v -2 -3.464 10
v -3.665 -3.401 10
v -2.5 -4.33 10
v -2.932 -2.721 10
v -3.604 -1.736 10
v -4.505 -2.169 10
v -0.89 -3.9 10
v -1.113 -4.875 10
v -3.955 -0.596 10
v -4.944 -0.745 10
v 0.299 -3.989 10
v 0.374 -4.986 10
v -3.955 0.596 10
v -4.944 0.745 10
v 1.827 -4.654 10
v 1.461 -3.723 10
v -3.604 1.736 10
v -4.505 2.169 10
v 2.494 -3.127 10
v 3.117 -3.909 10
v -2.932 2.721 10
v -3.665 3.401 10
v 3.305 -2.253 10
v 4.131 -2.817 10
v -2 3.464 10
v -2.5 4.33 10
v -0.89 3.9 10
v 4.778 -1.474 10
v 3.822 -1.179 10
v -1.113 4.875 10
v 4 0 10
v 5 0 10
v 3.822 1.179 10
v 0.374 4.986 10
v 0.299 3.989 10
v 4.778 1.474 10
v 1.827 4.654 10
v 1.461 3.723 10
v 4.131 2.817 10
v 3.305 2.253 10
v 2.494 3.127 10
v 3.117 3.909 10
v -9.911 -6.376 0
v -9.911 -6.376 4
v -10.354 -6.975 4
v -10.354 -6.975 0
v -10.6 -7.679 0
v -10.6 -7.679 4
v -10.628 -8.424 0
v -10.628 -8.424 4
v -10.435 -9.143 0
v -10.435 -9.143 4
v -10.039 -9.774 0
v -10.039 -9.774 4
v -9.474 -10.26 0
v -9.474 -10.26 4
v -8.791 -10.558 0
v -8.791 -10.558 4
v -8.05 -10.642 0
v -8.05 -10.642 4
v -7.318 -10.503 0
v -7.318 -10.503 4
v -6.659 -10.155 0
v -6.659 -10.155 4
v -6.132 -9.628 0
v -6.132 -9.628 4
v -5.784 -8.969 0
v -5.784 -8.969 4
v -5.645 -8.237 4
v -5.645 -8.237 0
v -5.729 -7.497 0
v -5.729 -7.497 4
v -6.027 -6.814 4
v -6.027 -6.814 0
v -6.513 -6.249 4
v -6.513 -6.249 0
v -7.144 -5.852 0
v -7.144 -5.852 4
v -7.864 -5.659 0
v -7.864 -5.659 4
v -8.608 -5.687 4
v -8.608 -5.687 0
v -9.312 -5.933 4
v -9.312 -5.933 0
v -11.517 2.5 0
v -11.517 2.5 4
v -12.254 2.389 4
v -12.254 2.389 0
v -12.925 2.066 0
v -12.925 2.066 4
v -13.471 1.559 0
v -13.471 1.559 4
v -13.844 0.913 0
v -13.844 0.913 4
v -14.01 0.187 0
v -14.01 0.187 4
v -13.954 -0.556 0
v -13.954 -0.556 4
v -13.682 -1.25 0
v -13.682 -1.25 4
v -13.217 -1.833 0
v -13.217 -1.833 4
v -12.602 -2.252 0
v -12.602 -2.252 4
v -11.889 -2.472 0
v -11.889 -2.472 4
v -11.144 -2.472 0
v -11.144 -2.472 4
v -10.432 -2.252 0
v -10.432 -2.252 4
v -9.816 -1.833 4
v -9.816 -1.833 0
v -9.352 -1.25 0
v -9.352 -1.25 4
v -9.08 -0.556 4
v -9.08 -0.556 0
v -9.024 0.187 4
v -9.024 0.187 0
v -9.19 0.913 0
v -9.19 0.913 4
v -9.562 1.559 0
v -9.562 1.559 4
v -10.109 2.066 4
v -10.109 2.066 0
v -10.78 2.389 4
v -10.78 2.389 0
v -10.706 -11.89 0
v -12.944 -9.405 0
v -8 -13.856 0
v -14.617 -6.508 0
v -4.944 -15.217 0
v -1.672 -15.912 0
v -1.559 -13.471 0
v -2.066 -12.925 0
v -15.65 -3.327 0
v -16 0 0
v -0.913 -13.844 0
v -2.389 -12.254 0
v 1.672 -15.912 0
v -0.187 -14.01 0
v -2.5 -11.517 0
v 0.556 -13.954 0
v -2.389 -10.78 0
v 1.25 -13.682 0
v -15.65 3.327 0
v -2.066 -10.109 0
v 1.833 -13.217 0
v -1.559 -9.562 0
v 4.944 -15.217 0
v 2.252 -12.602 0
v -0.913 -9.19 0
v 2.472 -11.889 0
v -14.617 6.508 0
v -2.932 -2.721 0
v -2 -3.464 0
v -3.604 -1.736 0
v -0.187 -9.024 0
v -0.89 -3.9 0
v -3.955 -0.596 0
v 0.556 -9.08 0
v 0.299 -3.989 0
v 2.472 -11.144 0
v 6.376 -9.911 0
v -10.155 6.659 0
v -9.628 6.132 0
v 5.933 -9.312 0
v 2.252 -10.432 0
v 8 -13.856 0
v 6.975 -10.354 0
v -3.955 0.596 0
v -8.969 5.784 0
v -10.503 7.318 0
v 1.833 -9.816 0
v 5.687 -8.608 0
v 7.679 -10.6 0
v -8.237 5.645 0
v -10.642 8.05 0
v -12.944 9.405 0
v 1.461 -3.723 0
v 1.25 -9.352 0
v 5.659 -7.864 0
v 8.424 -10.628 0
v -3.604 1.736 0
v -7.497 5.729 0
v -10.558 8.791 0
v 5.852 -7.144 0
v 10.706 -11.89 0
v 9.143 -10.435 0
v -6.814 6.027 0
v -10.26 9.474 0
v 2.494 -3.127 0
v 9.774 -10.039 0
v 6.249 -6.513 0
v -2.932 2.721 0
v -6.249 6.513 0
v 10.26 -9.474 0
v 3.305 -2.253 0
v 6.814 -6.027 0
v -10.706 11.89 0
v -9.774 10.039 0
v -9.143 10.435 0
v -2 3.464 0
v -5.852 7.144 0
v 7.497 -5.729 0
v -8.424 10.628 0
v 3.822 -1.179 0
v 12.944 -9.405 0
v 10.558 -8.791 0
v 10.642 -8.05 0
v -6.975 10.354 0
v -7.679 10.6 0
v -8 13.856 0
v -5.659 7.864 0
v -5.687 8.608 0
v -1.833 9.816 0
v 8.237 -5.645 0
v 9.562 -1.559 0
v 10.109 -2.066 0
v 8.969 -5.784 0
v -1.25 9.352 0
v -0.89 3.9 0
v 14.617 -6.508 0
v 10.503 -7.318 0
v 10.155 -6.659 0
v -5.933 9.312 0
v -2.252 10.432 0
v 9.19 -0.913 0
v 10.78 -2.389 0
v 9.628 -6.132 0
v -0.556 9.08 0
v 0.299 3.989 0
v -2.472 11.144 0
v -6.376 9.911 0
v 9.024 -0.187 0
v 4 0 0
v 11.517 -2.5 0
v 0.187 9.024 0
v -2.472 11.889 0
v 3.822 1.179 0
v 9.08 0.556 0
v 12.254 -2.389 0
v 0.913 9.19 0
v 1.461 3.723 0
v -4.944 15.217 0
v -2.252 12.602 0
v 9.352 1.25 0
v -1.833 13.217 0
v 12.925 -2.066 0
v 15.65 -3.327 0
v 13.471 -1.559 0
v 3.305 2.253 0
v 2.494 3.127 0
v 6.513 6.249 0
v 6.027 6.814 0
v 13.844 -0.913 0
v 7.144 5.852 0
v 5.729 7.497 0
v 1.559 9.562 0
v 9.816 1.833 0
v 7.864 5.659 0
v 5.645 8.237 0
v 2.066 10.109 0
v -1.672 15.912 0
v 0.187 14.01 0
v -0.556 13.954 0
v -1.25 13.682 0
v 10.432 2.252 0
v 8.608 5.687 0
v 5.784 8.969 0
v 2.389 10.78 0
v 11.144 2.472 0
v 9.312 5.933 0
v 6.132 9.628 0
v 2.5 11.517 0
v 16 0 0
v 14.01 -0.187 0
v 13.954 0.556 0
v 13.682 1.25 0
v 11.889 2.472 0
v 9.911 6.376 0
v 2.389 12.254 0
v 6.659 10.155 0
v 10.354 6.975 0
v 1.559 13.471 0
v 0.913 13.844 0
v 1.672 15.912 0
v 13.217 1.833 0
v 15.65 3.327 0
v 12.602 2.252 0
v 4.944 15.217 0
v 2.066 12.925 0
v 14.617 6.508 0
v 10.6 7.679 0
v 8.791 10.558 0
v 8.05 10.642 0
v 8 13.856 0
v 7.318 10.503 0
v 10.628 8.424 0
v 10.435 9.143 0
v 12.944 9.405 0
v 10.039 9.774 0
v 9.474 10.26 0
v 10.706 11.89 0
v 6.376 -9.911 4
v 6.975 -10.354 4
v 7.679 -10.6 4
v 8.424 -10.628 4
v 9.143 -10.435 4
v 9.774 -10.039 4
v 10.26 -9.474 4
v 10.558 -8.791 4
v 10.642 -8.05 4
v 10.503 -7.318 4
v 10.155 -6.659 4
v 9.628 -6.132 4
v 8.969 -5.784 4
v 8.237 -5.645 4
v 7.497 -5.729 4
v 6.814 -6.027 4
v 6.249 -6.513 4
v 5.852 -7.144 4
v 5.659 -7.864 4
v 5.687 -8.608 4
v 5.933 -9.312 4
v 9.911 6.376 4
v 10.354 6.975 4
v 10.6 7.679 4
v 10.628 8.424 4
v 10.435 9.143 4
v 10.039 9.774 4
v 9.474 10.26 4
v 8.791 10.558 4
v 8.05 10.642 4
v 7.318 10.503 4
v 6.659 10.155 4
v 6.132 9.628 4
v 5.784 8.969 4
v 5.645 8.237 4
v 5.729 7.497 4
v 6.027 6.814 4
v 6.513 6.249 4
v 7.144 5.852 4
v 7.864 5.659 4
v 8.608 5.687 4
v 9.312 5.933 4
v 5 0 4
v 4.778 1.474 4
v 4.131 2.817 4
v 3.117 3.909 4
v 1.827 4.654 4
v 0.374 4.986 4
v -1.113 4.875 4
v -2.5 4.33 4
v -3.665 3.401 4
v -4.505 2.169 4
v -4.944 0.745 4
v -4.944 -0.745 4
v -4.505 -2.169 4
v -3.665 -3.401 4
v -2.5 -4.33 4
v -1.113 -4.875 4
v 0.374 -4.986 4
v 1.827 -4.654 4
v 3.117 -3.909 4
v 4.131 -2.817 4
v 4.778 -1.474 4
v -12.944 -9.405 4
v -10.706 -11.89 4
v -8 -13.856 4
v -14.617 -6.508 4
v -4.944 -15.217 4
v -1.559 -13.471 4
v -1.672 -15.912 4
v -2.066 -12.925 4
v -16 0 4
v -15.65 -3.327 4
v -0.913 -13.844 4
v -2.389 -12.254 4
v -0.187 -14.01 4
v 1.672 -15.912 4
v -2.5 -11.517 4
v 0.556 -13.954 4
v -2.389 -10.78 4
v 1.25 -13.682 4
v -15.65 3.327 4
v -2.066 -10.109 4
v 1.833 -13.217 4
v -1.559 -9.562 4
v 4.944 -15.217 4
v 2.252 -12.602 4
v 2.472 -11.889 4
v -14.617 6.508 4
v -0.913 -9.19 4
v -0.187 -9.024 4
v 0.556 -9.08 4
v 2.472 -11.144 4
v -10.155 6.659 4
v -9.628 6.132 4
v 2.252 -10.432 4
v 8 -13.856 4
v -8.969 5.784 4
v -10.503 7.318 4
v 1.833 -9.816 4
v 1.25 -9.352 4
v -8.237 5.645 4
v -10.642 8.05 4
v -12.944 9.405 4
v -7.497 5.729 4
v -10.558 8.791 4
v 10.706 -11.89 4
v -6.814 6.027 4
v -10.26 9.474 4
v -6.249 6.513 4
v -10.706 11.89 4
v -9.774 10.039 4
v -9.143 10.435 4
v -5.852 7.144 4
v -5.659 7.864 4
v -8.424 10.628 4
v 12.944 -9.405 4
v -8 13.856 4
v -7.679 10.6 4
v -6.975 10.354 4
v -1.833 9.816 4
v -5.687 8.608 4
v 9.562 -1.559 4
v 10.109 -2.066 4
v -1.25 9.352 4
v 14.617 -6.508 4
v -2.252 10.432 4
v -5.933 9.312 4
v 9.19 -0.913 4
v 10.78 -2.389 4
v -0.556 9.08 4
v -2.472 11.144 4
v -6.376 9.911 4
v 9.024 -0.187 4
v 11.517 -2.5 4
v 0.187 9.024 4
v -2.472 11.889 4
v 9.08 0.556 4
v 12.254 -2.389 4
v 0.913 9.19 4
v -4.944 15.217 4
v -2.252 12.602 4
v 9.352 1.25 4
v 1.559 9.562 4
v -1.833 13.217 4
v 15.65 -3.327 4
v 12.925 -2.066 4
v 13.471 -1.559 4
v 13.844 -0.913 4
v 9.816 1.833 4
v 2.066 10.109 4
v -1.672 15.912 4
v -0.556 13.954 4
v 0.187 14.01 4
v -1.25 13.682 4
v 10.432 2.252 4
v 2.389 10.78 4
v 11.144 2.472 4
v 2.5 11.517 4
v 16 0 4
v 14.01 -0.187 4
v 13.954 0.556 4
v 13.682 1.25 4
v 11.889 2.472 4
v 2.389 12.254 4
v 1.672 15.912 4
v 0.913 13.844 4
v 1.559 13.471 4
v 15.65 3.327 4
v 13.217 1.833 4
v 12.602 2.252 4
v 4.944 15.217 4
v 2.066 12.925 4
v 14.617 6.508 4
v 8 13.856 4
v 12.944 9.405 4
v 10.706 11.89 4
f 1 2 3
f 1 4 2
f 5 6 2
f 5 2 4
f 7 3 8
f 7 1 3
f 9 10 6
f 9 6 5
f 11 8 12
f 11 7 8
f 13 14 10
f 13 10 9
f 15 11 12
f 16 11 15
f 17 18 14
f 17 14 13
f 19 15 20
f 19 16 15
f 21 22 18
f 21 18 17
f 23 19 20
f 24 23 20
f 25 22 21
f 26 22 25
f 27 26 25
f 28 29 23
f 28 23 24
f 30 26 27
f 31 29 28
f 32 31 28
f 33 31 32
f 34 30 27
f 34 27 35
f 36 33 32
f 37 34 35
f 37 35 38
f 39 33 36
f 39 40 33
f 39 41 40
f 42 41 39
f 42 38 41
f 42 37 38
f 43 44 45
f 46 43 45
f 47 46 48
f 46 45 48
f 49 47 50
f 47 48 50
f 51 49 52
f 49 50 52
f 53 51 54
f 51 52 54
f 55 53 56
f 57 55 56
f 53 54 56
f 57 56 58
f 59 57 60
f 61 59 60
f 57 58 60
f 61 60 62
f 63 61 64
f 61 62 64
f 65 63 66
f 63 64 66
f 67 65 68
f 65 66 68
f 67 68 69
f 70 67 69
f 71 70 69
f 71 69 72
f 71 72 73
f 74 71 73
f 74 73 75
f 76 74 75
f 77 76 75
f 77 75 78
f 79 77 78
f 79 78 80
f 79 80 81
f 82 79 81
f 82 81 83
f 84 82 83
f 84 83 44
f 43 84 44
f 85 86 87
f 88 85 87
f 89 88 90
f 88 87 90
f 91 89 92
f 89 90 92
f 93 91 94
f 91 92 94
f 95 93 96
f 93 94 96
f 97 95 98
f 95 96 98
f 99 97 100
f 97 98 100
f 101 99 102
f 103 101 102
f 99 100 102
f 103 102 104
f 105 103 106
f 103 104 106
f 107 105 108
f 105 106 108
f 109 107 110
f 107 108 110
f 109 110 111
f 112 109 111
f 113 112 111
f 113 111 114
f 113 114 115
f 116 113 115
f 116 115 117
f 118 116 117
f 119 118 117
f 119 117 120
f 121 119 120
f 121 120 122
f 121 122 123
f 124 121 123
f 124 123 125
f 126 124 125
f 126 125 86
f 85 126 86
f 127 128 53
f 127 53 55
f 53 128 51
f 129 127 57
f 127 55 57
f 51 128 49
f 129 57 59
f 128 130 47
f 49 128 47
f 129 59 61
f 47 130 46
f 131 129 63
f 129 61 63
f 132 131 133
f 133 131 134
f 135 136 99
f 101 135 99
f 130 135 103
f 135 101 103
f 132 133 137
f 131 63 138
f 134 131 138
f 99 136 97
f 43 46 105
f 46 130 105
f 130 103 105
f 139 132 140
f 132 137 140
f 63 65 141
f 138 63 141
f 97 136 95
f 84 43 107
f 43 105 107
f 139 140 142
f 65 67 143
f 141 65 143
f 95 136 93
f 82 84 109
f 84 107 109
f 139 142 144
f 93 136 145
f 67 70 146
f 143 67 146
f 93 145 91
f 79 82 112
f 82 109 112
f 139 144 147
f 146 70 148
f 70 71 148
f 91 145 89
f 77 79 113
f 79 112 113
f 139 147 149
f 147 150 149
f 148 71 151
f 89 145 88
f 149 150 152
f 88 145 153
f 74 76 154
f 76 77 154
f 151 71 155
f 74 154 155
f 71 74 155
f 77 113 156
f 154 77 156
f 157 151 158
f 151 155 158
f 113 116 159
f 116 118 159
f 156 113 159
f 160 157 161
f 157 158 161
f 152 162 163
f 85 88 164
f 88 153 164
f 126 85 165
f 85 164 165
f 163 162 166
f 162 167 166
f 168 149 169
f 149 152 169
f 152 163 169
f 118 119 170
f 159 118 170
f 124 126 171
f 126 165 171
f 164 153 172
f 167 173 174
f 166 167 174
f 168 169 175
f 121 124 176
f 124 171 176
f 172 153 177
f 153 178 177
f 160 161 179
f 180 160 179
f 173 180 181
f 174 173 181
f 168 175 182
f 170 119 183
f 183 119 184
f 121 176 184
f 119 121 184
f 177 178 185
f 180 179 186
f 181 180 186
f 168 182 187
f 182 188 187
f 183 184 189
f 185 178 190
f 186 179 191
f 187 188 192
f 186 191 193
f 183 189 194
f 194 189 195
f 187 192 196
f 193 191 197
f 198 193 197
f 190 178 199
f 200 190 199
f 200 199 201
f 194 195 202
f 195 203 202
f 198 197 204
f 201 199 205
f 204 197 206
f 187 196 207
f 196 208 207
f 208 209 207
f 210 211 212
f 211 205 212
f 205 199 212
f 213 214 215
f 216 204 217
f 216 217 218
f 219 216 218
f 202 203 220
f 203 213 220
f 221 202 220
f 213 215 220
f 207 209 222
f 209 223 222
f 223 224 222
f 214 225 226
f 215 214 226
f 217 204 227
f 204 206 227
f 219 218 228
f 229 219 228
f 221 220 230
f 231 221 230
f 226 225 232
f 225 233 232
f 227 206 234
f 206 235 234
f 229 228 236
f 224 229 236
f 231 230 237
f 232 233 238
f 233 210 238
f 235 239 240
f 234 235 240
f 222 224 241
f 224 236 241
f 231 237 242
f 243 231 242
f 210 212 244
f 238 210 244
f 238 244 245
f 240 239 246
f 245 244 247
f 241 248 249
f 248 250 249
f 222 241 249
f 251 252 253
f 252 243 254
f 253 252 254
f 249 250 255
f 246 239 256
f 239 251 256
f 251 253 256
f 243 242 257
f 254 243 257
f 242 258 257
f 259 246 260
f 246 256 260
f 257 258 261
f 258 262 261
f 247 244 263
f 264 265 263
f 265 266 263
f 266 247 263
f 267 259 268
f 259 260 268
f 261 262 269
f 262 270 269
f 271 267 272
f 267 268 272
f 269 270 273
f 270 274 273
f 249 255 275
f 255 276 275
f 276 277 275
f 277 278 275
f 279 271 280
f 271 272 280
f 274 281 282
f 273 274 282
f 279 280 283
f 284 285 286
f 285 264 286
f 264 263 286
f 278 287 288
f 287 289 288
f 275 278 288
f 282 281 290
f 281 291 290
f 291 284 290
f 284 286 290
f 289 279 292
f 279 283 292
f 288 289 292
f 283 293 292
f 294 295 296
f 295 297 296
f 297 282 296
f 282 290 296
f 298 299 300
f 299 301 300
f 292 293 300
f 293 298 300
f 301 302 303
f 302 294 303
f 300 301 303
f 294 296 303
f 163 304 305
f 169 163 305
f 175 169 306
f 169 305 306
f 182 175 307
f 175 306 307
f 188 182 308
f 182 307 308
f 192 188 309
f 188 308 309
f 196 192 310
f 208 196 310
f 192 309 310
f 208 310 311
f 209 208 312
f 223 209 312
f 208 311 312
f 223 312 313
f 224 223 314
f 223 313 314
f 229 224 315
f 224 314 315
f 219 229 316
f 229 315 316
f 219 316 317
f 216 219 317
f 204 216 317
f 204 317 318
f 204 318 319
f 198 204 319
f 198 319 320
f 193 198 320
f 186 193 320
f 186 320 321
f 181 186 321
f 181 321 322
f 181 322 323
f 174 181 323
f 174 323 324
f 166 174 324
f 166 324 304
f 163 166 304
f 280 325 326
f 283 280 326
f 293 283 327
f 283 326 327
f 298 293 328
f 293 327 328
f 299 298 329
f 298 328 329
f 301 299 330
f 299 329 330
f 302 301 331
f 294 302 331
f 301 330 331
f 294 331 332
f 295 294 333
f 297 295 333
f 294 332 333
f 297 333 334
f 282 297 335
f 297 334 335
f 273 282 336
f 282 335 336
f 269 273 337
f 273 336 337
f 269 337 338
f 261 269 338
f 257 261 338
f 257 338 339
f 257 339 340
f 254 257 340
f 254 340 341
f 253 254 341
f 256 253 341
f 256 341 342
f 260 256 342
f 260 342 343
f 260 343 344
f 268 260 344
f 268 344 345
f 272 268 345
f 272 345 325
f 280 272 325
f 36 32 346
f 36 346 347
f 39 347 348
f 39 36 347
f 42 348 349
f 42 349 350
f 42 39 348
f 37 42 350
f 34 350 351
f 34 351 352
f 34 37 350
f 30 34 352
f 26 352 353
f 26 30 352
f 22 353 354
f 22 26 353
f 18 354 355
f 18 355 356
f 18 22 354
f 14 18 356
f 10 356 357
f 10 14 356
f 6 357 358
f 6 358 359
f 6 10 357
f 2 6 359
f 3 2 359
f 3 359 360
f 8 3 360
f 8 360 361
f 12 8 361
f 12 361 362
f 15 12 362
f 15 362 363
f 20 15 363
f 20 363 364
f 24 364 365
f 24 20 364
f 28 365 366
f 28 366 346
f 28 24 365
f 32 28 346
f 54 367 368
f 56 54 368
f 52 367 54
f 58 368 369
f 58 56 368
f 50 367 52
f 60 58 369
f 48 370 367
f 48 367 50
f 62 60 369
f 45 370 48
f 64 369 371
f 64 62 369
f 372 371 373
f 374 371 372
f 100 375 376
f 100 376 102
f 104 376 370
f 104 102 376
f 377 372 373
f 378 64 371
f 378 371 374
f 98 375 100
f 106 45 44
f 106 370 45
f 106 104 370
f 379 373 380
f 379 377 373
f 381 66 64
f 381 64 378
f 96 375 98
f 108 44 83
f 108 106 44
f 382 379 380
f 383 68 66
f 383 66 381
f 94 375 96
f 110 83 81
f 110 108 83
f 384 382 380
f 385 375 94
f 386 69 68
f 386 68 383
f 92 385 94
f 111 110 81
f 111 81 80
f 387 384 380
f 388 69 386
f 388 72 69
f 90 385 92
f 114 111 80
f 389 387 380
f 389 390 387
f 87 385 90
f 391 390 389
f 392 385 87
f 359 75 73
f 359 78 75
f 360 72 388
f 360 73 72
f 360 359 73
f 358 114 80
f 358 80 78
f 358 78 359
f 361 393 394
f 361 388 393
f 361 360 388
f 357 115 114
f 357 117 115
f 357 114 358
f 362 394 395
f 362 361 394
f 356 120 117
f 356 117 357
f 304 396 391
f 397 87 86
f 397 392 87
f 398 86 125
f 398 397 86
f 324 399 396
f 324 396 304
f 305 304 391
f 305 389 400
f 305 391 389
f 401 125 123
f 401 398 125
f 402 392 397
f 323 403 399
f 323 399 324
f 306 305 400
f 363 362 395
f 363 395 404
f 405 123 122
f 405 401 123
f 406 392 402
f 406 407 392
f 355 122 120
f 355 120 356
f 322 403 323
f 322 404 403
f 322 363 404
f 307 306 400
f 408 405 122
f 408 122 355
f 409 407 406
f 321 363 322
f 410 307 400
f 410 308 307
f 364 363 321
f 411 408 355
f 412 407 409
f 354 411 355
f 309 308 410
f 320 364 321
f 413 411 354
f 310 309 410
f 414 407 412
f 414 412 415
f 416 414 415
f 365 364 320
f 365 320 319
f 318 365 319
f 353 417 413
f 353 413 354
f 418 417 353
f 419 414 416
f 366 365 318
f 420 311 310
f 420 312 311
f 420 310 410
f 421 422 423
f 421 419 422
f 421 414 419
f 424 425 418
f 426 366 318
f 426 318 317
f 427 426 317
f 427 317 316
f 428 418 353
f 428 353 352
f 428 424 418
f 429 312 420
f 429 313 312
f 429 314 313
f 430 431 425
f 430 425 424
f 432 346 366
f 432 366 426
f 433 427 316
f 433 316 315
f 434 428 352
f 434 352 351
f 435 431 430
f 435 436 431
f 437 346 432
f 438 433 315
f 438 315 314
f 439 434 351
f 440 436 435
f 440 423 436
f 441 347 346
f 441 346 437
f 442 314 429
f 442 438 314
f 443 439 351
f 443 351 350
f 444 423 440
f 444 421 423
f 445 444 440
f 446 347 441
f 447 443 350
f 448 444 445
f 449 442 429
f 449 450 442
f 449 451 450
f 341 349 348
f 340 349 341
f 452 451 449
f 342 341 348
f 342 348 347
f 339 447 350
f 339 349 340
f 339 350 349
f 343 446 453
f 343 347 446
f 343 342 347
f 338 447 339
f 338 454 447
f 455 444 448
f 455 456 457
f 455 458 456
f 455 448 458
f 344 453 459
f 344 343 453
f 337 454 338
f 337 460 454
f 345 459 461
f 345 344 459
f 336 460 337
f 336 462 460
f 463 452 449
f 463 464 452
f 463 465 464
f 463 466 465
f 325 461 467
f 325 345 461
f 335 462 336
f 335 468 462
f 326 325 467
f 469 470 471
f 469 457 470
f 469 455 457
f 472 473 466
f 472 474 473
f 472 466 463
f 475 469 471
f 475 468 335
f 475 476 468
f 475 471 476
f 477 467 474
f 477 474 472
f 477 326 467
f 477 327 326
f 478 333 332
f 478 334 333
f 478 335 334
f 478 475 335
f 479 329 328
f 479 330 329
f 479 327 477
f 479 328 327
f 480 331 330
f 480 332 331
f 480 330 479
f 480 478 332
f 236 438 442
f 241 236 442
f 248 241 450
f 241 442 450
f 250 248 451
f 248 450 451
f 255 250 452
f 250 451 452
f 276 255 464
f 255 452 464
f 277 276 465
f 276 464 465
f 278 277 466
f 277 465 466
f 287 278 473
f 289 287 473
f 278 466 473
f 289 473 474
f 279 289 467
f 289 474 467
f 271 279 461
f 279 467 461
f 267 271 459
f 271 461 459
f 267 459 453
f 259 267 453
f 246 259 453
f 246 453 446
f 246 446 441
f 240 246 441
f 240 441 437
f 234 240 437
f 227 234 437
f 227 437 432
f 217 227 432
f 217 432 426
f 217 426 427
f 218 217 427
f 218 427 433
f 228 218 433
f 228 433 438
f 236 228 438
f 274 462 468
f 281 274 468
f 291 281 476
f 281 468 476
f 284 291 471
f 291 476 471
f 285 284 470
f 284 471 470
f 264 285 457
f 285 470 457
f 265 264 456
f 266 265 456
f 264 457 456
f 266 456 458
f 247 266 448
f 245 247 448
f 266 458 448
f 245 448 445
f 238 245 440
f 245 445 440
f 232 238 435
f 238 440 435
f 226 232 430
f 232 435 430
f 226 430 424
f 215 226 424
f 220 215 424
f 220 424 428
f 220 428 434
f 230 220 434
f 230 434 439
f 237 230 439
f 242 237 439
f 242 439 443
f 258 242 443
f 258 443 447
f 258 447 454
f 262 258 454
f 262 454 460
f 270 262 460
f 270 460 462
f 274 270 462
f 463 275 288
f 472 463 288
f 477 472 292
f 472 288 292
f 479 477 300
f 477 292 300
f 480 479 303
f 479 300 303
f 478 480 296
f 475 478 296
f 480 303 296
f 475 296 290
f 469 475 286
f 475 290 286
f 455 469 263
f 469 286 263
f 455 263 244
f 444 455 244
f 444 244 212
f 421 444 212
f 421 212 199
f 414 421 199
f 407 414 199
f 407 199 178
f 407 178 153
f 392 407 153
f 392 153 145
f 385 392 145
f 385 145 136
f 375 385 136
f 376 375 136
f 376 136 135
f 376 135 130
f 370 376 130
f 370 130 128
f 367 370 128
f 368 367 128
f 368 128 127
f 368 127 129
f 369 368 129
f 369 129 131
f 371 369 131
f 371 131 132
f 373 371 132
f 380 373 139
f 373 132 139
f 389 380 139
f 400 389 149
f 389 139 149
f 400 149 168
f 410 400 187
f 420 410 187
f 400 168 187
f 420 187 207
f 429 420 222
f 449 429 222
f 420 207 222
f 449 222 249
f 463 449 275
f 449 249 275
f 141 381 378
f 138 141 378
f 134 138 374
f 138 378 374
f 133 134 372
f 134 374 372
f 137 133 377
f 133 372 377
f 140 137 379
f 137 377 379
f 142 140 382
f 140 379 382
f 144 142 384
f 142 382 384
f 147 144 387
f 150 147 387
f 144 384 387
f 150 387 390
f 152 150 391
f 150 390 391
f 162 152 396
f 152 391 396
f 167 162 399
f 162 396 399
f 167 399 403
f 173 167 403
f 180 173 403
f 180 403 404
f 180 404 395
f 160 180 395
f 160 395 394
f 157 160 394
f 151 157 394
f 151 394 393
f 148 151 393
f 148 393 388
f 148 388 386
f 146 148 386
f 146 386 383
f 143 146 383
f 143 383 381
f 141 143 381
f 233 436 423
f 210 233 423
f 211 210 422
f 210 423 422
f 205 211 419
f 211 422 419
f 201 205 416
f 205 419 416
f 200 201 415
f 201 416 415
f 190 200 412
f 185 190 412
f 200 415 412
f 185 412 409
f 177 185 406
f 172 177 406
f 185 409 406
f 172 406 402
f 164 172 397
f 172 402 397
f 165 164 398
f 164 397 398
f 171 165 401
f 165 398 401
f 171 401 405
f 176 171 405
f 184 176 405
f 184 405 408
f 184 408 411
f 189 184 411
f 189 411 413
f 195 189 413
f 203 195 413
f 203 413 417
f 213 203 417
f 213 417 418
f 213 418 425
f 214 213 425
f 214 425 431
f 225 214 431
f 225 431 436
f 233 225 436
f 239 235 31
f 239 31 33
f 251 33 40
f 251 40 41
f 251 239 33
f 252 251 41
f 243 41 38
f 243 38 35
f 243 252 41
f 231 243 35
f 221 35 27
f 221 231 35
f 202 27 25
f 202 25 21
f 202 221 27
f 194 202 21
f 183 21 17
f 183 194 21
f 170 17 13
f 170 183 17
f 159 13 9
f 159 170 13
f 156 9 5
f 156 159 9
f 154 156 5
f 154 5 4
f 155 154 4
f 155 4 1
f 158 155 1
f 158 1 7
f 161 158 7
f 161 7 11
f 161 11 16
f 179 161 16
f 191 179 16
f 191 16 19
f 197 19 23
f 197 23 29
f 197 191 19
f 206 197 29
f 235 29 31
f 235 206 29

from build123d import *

# Parameters (mm, degrees)
SKETCH_1_R               = 16
SKETCH_1_R_2             = 4
EXTRUDE_2_DEPTH          = 10
SKETCH_3_R               = 16
SKETCH_3_R_2             = 5
CUT_EXTRUDE_2_DEPTH      = 6
SKETCH_4_R               = 2.5
CUT_EXTRUDE_3_DEPTH      = 5
PATTERN_CIRCULAR_1_COUNT = 8


with BuildPart() as part:
    # 草图1 → 凸台-拉伸2 (new body)
    with BuildSketch(Plane.XY):
        Circle(SKETCH_1_R)
        Circle(SKETCH_1_R_2, mode=Mode.SUBTRACT)
    extrude(amount=EXTRUDE_2_DEPTH)

    # 草图3 → 切除-拉伸2 (cut)
    with BuildSketch(Plane.XY.offset(10)):
        Circle(SKETCH_3_R)
        Circle(SKETCH_3_R_2, mode=Mode.SUBTRACT)
    extrude(amount=-CUT_EXTRUDE_2_DEPTH, mode=Mode.SUBTRACT)

    # 草图4 → 切除-拉伸3 (cut, through all)
    with BuildSketch(Plane.XY.offset(4)):
        with Locations((0, 11.516849164)):
            Circle(SKETCH_4_R)
    cut_extrude_3 = extrude(amount=-CUT_EXTRUDE_3_DEPTH, mode=Mode.SUBTRACT)

    # 阵列(圆周)1: 切除-拉伸3 ×8 about axis
    pattern_circular_1_axis = Axis((0, 0, 0), (0, 0, 1))
    for i in range(1, PATTERN_CIRCULAR_1_COUNT):
        add(cut_extrude_3.rotate(pattern_circular_1_axis, i * 360 / PATTERN_CIRCULAR_1_COUNT), mode=Mode.SUBTRACT)


solid = part.part
